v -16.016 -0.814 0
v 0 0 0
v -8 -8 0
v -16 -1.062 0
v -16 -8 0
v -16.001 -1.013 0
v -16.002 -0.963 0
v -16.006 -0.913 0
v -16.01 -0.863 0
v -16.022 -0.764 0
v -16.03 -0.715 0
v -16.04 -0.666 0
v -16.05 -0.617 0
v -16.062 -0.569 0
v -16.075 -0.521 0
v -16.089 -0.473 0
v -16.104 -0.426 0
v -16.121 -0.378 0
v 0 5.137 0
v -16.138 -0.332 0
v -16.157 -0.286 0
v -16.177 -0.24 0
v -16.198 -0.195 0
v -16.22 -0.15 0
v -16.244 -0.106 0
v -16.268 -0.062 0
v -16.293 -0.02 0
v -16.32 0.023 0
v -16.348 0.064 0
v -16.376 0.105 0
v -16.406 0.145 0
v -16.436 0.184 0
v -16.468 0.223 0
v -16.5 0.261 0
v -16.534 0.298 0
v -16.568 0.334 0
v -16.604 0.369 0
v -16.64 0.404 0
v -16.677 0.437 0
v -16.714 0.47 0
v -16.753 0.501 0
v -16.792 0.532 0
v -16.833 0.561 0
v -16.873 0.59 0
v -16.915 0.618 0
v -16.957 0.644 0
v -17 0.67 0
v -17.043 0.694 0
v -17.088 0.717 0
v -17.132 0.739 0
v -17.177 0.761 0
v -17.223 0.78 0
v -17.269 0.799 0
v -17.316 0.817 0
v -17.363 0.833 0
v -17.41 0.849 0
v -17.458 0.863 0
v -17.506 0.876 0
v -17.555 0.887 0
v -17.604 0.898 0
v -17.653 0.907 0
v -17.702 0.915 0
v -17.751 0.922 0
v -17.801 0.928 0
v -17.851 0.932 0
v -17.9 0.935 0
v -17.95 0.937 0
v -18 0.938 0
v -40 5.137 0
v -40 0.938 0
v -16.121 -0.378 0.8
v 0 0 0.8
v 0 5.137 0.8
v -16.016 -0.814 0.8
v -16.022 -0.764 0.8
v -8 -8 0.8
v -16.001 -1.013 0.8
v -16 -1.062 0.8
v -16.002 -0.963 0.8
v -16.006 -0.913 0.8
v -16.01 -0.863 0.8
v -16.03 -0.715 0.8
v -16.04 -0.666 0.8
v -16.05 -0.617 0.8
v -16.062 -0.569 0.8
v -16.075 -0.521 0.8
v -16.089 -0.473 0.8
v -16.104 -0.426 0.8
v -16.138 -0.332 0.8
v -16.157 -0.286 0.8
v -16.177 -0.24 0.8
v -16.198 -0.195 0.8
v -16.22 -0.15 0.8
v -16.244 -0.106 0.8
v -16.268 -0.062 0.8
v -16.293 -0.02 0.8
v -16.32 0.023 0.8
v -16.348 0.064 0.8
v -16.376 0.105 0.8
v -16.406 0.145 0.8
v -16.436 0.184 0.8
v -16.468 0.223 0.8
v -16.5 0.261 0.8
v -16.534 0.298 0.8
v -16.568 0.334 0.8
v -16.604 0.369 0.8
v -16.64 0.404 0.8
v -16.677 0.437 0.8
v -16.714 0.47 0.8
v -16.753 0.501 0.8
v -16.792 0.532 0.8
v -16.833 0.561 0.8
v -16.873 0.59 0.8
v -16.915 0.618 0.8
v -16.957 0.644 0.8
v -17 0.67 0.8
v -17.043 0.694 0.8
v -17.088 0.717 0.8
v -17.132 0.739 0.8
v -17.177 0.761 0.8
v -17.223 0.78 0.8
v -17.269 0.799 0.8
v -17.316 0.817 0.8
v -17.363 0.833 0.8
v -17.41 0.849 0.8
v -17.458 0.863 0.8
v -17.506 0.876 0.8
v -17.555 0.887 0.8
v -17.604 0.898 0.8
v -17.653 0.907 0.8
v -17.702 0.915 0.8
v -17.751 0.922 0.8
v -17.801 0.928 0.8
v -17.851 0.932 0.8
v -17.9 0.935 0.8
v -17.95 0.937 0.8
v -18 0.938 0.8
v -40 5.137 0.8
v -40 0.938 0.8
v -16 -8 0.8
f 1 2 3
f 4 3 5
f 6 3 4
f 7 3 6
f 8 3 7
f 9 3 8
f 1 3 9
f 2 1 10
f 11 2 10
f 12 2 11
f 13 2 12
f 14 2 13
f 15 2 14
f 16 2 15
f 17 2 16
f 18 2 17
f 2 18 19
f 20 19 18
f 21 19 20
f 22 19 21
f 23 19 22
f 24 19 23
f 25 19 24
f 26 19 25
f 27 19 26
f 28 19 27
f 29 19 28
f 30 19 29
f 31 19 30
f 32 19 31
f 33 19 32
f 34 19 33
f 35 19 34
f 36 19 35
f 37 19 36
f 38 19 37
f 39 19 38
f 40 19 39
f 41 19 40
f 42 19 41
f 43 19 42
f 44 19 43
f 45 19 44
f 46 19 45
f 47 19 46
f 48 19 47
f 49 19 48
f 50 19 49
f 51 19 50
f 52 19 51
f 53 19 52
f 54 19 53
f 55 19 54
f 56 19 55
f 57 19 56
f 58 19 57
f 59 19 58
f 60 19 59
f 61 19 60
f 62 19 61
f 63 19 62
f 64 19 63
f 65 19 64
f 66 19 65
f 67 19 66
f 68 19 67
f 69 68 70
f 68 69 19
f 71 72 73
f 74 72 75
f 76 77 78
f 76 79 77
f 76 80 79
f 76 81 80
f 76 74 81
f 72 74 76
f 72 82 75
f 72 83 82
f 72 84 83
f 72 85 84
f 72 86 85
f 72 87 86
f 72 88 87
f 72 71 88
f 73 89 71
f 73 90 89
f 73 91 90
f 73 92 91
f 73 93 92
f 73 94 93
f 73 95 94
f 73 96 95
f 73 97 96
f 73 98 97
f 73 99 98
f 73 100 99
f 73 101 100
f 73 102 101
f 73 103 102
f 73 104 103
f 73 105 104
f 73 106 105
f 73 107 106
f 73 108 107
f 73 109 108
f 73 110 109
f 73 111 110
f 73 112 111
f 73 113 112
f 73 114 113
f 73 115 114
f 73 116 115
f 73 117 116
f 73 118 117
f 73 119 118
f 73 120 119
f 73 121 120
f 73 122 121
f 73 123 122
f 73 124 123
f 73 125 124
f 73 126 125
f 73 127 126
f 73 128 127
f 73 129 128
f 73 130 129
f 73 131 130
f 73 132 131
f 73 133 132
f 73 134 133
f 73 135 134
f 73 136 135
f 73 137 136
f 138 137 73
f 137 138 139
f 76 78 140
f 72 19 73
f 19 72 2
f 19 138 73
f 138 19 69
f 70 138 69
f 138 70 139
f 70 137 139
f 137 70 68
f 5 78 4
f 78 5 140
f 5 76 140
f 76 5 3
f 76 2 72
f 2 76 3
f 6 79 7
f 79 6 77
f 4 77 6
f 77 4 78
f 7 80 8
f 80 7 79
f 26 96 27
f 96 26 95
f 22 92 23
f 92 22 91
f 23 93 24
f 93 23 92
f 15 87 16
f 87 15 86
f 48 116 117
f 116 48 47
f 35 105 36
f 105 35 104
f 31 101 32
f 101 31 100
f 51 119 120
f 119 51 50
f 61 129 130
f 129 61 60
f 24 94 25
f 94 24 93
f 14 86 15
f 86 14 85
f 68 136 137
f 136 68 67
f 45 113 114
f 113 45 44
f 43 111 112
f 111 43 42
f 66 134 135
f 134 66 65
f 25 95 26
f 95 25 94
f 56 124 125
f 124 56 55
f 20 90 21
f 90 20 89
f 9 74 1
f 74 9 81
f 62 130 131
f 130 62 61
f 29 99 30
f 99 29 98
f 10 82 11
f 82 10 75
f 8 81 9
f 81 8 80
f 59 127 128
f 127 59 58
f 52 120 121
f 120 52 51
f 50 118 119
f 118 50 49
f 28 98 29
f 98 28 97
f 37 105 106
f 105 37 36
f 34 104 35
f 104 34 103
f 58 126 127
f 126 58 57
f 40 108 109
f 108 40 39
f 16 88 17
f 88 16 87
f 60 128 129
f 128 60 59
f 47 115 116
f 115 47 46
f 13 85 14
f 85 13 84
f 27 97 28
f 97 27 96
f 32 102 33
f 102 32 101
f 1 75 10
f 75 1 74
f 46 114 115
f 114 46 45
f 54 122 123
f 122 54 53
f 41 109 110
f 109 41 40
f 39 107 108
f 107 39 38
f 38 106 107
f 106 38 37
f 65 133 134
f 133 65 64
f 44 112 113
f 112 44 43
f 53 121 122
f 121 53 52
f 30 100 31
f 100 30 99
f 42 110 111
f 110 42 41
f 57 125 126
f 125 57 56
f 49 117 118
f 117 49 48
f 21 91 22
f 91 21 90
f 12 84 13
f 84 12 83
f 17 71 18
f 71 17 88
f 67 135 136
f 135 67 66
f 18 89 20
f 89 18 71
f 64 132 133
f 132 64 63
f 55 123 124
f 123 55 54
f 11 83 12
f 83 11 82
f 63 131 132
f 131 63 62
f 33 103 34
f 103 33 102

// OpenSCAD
// file: ../scad/shape_modifier_utils.scad
// Overlap used to break coincident faces in booleans. Subtracting a cut that lands
// exactly on a surface leaves zero-thickness geometry, which renders unpredictably and
// slices worse; every cut is extended by this much so the faces genuinely cross.
//
// A function rather than a variable: `use <...>` exports functions but not top-level
// variable assignments, and the sweep reaches these files through `use`. Twelve modules
// across four files each declared their own `eps = 0.01` before this existed.
function geometry_eps() = 0.01;

// Length for a *centred* cutting solid that must pass entirely through material of
// depth `extent`. A centred cut reaches half this each way, so the factor leaves 50%
// clearance beyond `extent` on both sides -- a cut that lands flush on a face produces
// a zero-thickness shell rather than a clean hole.
//
// Measured against the swept parameter space: the deepest thing any of these cuts must
// clear is one bulkhead_section, one bulkhead_thickness tall, so the margin is 0.5 *
// bulkhead_thickness everywhere and scales with the part. Interconnect bulkheads stack
// two sections, but each section's cuts are applied before stacking, so the stack is
// not what a cut has to span.
function through_cut(extent) = 3 * extent;

// Distance at which to place a mask vertex so it lies outside anything within `extent`
// of the origin. Used by the half-plane polygons that trim an octant down to its
// wedge, where the vertex position only has to be "far enough" to be off the part.
//
// Worst case across 412 valid combinations is 3.25 mm of clearance, at U=0.5 with 1 mm
// panel: the shape reaches panel_offset + panel_overlap = 6.75 mm while the mask sits
// at 10 mm. Positive everywhere, and the gap widens with U.
function mask_reach(extent) = 2 * extent;


module octant_to_full() {
    mirror_x() {
        mirror_y() {
            mirror_xy() {
                children();
            }
        }
    }
}

module mirror_x() {
    union() {
        children();
        mirror([-1,0,0]) {
            children();
        }
    }
    
}

module mirror_y() {
    union() {
        children();
        mirror([0,-1,0]) {
            children();
        }
    }
    
}

module mirror_xy() {
    union() {
        children();
        mirror([1,-1,0]) {
            children();
        }
    }
}

module corner_translate(unit_width, corner_radius) {
    translate([unit_width/2-corner_radius,unit_width/2-corner_radius,0]) {
        children();
    }
}

// Move an octant out to its corner, then mirror it into all four -- the standard way
// a bulkhead profile is built from the one octant that is actually drawn.
//
// Every `*_shape` wrapper in fuselage_bulkhead_geometry.scad had this same pair open-
// coded around its own `*_octant` call. The wrappers stay: they name the full shape as
// distinct from the octant, and they are what seven call sites across two files use.
// It is the repeated body that is worth removing, not the interface.
module octant_tiled(unit_width, corner_radius) {
    octant_to_full() {
        corner_translate(unit_width, corner_radius) {
            children();
        }
    }
}


// mask lower diagonal quadrant
module octant_mask(unit_width, corner_radius) {
    eps = geometry_eps();
    polygon([[corner_radius+eps,corner_radius],
            [corner_radius+eps,-unit_width/2-corner_radius],
            [-unit_width/2-corner_radius+eps,-unit_width/2-corner_radius]]);
}

// fillet inward
module fillet_inner(radius) {
    intersection() {
        offset(r = -radius) {
            // fillet outward as well to ensure we round off any inward fillet artifacts (from input boundaries that are closer than 2*radius)
            offset(r = 2*radius) {
                offset(r = -radius) {
                    children();
                }
            }
        }
        // guarantee that the resultant shape has not gone outside the boundaries of the input shape
        children();
    }
}

// fillet outward
module fillet_outer(radius) {
    union() {
        offset(r = -radius) {
            offset(r = radius) {
                children();
            }
        }
        // guarantee that the resultant shape has not erroded into the boundaries of teh input shape
        children();
    }
}
// main file
// bulkhead_web isolated, at the derived parameters for U=1.0 end_bolt 3/16in.
//
// Note this web's fillet is already a TRUE fillet -- the module subtracts a cylinder of
// web_fillet_radius at the re-entrant corner. It is not the morphological fillet_inner that
// OQ-DES-B9 is about; that one appears in bulkhead_web_inner_shape_octant, which this
// non-interconnect path does not use.
$fa=1;
$fs=0.05;

use <../scad/fuselage_bulkhead_geometry.scad>

is_interconnect = false;
unit_width = 100.0;
bulkhead_thickness = 6;
corner_radius = 10.0;
panel_thickness = 4.7625;
panel_offset = 2.5;
panel_overlap = 4.7625;
panel_tolerance = 0.1;
bolt_hole_radius = 2.0;
bolt_thickness = 3.0;
bolt_offset = 8.0;
plate_thickness = 0.8;
web_fillet_radius = 2.0;
web_width = 3.0;
flange_thickness = 1.2;

bulkhead_web(is_interconnect, unit_width, bulkhead_thickness, corner_radius,
             panel_thickness, panel_offset, panel_overlap, panel_tolerance,
             bolt_hole_radius, bolt_thickness, bolt_offset, plate_thickness,
             web_fillet_radius, web_width, flange_thickness);
